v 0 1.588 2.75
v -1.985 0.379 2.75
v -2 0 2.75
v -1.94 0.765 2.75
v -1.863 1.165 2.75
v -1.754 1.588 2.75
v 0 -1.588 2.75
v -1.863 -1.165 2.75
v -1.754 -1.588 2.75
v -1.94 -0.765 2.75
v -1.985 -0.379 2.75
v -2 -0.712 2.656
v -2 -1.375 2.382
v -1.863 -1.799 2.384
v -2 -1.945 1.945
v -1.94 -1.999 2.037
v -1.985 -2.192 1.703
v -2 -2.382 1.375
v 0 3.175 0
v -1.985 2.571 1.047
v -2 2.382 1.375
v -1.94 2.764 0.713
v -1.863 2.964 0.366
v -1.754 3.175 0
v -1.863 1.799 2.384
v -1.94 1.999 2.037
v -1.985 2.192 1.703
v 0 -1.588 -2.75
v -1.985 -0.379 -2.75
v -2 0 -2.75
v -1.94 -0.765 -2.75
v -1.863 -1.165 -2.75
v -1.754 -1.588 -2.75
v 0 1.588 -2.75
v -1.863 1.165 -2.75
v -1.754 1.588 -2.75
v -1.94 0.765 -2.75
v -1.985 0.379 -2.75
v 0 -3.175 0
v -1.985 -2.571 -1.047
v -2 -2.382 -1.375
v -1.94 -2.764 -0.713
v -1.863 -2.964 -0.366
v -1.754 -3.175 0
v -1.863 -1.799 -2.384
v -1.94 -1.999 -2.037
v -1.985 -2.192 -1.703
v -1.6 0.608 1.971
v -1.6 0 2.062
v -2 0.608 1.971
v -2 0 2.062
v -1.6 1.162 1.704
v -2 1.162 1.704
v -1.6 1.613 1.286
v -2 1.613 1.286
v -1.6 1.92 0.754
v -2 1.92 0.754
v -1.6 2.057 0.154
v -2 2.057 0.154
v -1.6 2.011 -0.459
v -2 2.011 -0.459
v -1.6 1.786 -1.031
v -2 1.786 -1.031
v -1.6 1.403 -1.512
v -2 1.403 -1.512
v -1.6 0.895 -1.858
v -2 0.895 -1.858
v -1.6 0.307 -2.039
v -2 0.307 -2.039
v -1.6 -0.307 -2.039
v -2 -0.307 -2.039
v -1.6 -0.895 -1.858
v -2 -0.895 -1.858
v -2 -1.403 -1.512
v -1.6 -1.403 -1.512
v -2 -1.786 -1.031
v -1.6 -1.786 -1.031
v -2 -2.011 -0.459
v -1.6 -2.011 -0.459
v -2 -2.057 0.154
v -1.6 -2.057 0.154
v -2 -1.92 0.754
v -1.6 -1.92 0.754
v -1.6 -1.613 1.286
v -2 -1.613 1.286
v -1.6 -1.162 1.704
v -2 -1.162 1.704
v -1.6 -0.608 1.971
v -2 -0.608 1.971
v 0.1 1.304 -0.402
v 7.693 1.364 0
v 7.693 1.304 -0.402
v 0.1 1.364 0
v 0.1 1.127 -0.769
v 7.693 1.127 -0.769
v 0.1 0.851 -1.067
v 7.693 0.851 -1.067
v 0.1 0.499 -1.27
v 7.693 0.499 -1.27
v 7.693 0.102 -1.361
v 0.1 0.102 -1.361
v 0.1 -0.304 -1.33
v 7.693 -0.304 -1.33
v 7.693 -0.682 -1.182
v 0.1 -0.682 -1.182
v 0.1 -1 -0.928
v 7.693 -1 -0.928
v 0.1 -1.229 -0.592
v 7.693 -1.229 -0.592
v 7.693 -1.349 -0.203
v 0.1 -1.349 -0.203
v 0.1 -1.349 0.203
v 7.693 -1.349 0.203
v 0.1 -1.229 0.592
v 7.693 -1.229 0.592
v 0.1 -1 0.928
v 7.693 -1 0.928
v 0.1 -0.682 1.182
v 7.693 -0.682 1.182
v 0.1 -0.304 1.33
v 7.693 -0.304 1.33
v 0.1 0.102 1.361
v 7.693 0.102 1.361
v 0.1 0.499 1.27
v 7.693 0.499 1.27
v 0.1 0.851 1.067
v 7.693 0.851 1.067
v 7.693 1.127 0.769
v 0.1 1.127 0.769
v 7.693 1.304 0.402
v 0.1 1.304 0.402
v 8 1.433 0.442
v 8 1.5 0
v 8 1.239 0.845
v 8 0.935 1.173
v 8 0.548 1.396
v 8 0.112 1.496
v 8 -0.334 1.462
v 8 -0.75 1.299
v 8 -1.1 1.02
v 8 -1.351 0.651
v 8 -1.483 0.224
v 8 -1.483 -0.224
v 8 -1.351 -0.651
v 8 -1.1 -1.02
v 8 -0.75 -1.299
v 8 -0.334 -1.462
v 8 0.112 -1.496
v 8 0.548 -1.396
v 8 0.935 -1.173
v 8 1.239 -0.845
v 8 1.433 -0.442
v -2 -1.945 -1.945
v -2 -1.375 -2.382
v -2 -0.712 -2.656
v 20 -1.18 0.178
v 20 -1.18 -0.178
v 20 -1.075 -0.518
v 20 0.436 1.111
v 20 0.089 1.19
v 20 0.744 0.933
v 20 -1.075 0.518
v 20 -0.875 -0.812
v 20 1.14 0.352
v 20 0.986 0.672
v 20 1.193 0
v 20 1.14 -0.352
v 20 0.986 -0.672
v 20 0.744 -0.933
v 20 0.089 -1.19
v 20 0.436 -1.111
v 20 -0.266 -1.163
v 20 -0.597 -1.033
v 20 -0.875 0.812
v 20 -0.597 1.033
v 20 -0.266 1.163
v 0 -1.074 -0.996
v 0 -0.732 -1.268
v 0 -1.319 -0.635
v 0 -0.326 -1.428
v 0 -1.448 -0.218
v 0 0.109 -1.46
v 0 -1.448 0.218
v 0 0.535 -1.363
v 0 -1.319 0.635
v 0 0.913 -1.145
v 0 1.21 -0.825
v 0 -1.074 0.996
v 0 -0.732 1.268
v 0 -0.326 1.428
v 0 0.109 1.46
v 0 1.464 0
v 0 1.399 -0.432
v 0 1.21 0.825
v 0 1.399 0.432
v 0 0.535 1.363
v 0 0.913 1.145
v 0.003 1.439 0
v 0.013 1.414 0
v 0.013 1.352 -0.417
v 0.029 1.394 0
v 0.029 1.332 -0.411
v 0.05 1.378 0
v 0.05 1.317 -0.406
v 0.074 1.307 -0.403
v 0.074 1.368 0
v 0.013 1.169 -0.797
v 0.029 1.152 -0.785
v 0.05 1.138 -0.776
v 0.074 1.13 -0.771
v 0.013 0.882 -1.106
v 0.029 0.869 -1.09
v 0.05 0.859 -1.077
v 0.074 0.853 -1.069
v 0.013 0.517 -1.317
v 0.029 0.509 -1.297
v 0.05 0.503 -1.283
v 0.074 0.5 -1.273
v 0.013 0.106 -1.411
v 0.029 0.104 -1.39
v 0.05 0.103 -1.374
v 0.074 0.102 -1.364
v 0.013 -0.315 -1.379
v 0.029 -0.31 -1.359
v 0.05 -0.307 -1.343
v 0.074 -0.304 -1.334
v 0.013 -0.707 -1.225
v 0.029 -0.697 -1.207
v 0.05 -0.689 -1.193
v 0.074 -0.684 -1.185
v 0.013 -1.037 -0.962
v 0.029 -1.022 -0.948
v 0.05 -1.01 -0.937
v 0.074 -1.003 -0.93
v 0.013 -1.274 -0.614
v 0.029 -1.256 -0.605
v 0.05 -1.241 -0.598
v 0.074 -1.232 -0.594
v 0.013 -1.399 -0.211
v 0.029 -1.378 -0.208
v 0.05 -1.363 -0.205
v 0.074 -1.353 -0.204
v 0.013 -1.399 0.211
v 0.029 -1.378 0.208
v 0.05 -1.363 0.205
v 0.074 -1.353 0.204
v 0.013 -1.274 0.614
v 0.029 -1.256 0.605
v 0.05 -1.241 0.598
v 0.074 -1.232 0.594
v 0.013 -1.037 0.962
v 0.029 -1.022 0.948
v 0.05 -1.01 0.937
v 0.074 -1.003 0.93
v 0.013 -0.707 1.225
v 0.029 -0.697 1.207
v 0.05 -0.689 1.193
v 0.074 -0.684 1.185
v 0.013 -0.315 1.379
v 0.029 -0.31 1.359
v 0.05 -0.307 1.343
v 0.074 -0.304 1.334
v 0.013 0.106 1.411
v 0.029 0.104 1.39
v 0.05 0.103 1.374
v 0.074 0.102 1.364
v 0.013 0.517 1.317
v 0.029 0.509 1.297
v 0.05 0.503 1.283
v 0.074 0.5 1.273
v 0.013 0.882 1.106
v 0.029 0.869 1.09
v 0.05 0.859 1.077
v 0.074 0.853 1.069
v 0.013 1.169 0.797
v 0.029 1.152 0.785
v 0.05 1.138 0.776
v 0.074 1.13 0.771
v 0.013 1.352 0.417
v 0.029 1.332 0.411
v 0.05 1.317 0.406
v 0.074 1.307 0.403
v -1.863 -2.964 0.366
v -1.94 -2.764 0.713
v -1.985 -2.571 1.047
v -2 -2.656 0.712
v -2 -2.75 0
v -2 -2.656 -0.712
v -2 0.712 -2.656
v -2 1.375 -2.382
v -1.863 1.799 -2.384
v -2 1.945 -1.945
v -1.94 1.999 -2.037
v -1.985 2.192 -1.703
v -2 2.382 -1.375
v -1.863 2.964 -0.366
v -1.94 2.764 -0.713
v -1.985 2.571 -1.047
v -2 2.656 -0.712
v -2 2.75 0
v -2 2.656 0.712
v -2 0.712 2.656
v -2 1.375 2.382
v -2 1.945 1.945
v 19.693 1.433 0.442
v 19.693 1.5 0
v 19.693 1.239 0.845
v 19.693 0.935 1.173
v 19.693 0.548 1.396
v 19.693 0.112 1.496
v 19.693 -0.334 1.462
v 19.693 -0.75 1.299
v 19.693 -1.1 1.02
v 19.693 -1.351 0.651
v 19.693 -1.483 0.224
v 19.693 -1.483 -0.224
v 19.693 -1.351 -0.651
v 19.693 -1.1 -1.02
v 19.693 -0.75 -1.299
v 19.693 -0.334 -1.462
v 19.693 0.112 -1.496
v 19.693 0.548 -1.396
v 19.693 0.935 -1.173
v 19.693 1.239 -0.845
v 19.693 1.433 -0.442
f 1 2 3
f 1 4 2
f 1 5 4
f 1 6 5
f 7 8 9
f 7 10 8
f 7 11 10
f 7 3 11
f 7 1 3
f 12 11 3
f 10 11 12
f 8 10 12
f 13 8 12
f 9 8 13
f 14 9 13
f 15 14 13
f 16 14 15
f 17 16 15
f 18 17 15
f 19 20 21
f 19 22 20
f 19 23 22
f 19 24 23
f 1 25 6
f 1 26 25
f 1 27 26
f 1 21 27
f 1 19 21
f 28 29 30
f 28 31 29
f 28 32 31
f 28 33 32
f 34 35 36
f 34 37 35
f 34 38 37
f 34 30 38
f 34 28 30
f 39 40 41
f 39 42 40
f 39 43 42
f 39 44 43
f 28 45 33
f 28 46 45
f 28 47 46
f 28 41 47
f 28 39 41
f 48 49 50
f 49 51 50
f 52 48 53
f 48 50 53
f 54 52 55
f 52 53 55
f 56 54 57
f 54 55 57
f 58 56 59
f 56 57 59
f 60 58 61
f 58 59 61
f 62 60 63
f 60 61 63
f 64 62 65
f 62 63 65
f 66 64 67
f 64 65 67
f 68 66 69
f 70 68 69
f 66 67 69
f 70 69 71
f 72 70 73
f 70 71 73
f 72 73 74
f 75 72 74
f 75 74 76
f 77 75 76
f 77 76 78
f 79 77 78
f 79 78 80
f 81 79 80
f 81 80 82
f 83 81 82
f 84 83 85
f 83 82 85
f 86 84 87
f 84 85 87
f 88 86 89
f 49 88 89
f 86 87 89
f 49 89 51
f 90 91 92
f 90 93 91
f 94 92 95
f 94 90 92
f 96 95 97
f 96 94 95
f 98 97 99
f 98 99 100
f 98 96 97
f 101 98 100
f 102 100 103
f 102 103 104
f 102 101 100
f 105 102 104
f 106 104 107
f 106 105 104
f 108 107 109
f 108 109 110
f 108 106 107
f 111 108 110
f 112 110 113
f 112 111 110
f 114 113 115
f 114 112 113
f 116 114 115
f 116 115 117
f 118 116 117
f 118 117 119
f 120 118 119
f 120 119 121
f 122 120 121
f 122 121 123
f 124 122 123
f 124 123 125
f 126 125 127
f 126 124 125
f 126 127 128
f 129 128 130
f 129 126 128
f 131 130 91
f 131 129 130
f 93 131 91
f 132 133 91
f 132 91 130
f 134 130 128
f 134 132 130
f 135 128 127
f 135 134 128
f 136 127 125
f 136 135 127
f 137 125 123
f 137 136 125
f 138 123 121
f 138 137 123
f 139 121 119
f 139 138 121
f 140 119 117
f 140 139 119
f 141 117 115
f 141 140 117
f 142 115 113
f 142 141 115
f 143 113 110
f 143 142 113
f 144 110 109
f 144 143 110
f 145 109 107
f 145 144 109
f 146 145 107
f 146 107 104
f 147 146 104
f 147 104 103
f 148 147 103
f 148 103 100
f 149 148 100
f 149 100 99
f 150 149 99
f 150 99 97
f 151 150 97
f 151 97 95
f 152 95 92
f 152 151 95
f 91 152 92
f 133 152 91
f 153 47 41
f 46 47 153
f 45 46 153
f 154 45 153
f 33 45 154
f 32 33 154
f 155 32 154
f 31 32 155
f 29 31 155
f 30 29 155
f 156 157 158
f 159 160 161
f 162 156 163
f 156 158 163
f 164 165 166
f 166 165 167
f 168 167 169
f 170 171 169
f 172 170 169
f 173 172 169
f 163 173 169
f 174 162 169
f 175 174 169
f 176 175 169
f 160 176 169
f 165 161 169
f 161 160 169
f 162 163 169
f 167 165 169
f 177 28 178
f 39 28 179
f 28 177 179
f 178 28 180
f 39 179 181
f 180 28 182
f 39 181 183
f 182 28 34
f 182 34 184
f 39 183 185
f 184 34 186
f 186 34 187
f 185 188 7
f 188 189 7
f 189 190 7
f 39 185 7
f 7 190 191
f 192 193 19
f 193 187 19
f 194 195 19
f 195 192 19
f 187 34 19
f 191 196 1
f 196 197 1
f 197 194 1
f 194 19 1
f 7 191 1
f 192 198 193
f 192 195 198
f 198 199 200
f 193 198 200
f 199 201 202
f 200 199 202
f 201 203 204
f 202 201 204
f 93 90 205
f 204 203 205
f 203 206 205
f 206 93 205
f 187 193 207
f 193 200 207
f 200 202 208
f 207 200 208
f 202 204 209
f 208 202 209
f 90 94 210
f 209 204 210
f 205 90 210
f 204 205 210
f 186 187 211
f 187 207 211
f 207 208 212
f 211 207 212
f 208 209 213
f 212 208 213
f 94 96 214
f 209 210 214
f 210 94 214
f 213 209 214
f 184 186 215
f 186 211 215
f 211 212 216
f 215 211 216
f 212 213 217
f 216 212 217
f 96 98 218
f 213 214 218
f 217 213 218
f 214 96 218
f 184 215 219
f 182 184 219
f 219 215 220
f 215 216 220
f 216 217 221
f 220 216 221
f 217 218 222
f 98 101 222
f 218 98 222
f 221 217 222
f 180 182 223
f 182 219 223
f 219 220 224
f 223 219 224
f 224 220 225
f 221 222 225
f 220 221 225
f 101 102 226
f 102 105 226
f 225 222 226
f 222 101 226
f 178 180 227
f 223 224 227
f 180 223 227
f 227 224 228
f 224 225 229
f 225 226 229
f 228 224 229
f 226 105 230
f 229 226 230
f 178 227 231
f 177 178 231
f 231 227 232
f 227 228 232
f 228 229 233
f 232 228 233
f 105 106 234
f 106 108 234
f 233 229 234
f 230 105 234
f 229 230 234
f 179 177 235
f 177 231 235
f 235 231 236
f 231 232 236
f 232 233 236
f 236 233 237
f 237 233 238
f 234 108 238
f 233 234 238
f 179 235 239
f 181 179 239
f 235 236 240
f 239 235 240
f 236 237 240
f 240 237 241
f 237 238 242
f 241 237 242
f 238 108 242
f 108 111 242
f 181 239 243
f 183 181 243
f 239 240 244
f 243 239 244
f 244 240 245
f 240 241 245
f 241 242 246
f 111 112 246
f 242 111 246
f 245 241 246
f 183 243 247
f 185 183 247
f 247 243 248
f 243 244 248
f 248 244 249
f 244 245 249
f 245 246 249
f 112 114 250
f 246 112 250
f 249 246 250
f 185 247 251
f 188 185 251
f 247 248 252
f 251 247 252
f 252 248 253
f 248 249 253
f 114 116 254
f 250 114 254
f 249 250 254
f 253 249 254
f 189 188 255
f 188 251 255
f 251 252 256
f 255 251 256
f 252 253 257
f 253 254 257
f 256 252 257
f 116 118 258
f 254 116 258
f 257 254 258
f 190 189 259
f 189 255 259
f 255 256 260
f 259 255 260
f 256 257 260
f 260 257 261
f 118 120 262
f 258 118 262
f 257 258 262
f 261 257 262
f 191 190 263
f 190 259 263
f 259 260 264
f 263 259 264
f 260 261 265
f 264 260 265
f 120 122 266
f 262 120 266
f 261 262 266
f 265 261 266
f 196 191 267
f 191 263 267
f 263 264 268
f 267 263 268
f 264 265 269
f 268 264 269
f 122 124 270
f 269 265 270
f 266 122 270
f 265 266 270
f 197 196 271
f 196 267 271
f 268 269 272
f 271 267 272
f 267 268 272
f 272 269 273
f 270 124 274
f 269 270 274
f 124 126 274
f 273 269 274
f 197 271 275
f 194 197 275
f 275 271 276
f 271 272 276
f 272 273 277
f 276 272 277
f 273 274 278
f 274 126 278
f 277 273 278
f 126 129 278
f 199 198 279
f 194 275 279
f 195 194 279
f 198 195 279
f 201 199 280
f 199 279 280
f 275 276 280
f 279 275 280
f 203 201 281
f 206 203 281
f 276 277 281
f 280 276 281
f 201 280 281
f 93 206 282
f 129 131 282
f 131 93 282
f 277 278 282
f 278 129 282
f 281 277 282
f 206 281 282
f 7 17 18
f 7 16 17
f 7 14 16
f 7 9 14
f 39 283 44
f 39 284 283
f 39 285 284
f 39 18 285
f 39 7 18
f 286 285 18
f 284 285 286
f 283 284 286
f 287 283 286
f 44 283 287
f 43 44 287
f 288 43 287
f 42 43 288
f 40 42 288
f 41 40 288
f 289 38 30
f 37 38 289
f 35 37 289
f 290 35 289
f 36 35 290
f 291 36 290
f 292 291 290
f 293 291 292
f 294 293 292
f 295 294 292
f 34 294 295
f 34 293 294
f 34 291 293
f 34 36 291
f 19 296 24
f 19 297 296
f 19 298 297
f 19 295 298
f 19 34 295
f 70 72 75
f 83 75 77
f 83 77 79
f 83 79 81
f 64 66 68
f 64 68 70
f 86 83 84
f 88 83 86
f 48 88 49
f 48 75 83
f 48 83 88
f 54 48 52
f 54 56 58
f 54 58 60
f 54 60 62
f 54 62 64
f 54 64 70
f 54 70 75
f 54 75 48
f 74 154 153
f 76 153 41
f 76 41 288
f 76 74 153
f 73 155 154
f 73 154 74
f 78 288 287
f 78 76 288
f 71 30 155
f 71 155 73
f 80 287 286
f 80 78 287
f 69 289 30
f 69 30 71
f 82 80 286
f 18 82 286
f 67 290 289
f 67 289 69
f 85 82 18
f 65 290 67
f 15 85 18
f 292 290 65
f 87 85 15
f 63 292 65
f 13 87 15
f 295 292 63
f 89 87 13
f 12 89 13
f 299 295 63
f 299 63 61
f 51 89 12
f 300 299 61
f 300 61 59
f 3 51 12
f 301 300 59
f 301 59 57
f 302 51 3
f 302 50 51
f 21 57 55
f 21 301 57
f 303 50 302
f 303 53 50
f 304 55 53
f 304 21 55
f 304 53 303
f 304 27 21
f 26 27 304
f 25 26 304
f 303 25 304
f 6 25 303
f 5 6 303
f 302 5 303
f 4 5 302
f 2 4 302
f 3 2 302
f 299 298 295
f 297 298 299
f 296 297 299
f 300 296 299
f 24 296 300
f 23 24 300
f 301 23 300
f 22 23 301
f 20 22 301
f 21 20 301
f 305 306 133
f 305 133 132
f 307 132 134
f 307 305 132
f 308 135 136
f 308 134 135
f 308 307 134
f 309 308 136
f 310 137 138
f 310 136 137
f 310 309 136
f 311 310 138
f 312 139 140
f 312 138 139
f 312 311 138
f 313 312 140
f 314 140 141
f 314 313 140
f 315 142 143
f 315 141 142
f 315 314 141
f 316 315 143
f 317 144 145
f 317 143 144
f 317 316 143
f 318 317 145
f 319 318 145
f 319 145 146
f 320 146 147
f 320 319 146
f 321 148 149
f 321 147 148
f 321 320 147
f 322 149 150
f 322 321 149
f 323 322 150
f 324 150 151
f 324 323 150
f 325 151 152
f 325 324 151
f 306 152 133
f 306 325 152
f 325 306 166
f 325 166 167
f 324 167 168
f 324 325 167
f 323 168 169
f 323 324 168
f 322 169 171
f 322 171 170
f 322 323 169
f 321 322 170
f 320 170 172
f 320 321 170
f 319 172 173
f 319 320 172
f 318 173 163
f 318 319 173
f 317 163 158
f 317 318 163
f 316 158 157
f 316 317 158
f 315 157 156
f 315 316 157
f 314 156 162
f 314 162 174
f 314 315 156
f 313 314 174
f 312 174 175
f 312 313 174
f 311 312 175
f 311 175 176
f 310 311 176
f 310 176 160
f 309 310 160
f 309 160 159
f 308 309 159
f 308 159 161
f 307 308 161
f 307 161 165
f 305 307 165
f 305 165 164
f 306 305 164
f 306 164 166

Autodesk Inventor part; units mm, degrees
ref_plane "YZ Plane" through (0, 0, 0) normal (1, 0, 0) x (0, 1, 0)
ref_plane "XZ Plane" through (0, 0, 0) normal (0, 1, 0) x (-1, 0, 0)
sketch "Sketch1" plane through (0, 0, 0) normal (0, 0, 1) x (1, 0, 0)
  line L0 (0, 2.2) -> (0, 1.3645)
  line L1 (8, 1.5) -> (20, 1.5)
  line L2 (20, 1.5) -> (20, 0)
  line L3 (20, 0) -> (-0.0001, 0)
  line L4 (-4.0001, 0) -> (24, 0) projected
  line L5 (-0.0001, 0) -> (-0.0001, 2.2)
  line L6 (-0.0001, 2.2) -> (0, 2.2)
  line L7 (8, 1.5) -> (7.6932, 1.3645)
  line L8 (7.6932, 1.3645) -> (0, 1.3645)
  line L9 (0, -0.44) -> (0, 2.64) projected
  line L10 (7.6932, 1.3645) -> (7.6932, 0) construction
  line L11 (8, 1.5) -> (8, 0) construction
  dimension "d0" = 20
  dimension "d1" = 12
  dimension "d2" = 3
  dimension "d9" = 0.0001
  dimension "d10" = 4.4
  dimension "d13" = 0.3068
  dimension "d14" = 2.729
revolve "Body" add sketch "Sketch1" angle 360 about axis through (20, 0, 0) along (-1, 0, 0)
sketch "Sketch2" plane through (-0.0001, 0, 0) normal (-1, 0, 0) x (0, 0, 1)
  line L0 (0, 3.1754) -> (2.75, 1.5877)
  line L1 (2.75, 1.5877) -> (2.75, -1.5877)
  line L2 (2.75, -1.5877) -> (0, -3.1754)
  line L3 (0, -3.1754) -> (-2.75, -1.5877)
  line L4 (-2.75, -1.5877) -> (-2.75, 1.5877)
  line L5 (-2.75, 1.5877) -> (0, 3.1754)
  point P0 (0, 0)
  point P1 (0, 0)
  dimension "d11" = 5.5
extrude "Head" add sketch "Sketch2" along normal blind 2
sketch "Sketch3" plane through (-2.0001, 0, 0) normal (-1, 0, 0) x (0, 0, 1)
  circle A0 centre (0, 0) radius 2.0625
  point P0 (0, 0)
  dimension "d19" = 4.125
extrude "Indent1" cut sketch "Sketch3" against normal blind 0.4
sketch "Sketch4" plane through (0, 0, 0) normal (0, 0, 1) x (1, 0, 0)
  line L0 (-2.0001, 2.75) -> (-2.0001, 3.1754)
  line L1 (-2.0001, 3.1754) -> (-1.7545, 3.1754)
  line L2 (-1.7545, 3.1754) -> (-2.0001, 2.75)
  line L3 (-2.4001, 0) -> (0.3999, 0) projected
  line L4 (-0.0001, 3.1754) -> (-2.0001, 3.1754) projected
  line L5 (-2.0001, 1.5877) -> (-2.0001, 3.1754) projected
  dimension "d5" = 30
  dimension "d23" = 5.5
revolve "Chamfer1" cut sketch "Sketch4" angle 360 about axis through (-10, 0, 0) along (1, 0, 0)
fillet "Fillet1" radius 0.1 1 edges at (0, -1.3645, 0)
thread "Thread" size "M3x0.5" designation "M3" class "6g" standard "GB Metric profile" length 12
chamfer "Chamfer2" distance 0.3067 distance2 0.3068 1 edges at (20, -1.5, 0) measured on face at (20, -0.3888, -0.2119)
ref_plane "Work Plane1" through (14, 0, 0) normal (0, 0, -1) x (1, 0, 0)
equation "\"d0\" = NLG"
equation "\"d1\" = GEL"
equation "\"d2\" = GD"
equation "\"d10\" = SD2"
equation "\"d14\" = BDM"
equation "\"d11\" = SW"
equation "\"d3\" = KOH - SD"
equation "\"d19\" = 0.75 * SW0"
equation "\"d20\" = 0.2 * KOH"
equation "\"d5\" = ANG1"
equation "\"d23\" = SW0"
equation "\"d18\" = RR"
equation "\"d15\" = GEL"
equation "\"d6\" = -0.5 * SPD + 0.5 * GD"
equation "\"NLG\" = 20"
equation "\"GD\" = NND"
equation "\"BDM\" = 2.729"
equation "\"KOH\" = 2"
equation "\"GEL\" = 12"
equation "\"SW\" = 5.5"
equation "\"SW0\" = SW"
equation "\"SPD\" = NND - 1.2269 * PTC"
equation "\"SD2\" = SDH"
equation "\"SD\" = 0"
equation "\"ANG1\" = 30deg"
equation "\"GAL\" = 0.61345 * PTC"
equation "\"GUL\" = 0.61345 * PTC"
equation "\"RR\" = 0.1"
equation "\"WFT\" = 0"
equation "\"GD1\" = THREADDIA - 1.2269 * PTC"
equation "\"THREADDIA\" = 3"
equation "\"SDH\" = 4.4"
equation "\"TOA\" = 30deg"
equation "\"FAWI\" = 90deg"
equation "\"PTC\" = 0.5"
equation "\"NND\" = 3"
equation "\"E0\" = 1.155 * SW"
properties part number "Bolt GB 5784-86-M3 x 20" material "Steel, Mild"
